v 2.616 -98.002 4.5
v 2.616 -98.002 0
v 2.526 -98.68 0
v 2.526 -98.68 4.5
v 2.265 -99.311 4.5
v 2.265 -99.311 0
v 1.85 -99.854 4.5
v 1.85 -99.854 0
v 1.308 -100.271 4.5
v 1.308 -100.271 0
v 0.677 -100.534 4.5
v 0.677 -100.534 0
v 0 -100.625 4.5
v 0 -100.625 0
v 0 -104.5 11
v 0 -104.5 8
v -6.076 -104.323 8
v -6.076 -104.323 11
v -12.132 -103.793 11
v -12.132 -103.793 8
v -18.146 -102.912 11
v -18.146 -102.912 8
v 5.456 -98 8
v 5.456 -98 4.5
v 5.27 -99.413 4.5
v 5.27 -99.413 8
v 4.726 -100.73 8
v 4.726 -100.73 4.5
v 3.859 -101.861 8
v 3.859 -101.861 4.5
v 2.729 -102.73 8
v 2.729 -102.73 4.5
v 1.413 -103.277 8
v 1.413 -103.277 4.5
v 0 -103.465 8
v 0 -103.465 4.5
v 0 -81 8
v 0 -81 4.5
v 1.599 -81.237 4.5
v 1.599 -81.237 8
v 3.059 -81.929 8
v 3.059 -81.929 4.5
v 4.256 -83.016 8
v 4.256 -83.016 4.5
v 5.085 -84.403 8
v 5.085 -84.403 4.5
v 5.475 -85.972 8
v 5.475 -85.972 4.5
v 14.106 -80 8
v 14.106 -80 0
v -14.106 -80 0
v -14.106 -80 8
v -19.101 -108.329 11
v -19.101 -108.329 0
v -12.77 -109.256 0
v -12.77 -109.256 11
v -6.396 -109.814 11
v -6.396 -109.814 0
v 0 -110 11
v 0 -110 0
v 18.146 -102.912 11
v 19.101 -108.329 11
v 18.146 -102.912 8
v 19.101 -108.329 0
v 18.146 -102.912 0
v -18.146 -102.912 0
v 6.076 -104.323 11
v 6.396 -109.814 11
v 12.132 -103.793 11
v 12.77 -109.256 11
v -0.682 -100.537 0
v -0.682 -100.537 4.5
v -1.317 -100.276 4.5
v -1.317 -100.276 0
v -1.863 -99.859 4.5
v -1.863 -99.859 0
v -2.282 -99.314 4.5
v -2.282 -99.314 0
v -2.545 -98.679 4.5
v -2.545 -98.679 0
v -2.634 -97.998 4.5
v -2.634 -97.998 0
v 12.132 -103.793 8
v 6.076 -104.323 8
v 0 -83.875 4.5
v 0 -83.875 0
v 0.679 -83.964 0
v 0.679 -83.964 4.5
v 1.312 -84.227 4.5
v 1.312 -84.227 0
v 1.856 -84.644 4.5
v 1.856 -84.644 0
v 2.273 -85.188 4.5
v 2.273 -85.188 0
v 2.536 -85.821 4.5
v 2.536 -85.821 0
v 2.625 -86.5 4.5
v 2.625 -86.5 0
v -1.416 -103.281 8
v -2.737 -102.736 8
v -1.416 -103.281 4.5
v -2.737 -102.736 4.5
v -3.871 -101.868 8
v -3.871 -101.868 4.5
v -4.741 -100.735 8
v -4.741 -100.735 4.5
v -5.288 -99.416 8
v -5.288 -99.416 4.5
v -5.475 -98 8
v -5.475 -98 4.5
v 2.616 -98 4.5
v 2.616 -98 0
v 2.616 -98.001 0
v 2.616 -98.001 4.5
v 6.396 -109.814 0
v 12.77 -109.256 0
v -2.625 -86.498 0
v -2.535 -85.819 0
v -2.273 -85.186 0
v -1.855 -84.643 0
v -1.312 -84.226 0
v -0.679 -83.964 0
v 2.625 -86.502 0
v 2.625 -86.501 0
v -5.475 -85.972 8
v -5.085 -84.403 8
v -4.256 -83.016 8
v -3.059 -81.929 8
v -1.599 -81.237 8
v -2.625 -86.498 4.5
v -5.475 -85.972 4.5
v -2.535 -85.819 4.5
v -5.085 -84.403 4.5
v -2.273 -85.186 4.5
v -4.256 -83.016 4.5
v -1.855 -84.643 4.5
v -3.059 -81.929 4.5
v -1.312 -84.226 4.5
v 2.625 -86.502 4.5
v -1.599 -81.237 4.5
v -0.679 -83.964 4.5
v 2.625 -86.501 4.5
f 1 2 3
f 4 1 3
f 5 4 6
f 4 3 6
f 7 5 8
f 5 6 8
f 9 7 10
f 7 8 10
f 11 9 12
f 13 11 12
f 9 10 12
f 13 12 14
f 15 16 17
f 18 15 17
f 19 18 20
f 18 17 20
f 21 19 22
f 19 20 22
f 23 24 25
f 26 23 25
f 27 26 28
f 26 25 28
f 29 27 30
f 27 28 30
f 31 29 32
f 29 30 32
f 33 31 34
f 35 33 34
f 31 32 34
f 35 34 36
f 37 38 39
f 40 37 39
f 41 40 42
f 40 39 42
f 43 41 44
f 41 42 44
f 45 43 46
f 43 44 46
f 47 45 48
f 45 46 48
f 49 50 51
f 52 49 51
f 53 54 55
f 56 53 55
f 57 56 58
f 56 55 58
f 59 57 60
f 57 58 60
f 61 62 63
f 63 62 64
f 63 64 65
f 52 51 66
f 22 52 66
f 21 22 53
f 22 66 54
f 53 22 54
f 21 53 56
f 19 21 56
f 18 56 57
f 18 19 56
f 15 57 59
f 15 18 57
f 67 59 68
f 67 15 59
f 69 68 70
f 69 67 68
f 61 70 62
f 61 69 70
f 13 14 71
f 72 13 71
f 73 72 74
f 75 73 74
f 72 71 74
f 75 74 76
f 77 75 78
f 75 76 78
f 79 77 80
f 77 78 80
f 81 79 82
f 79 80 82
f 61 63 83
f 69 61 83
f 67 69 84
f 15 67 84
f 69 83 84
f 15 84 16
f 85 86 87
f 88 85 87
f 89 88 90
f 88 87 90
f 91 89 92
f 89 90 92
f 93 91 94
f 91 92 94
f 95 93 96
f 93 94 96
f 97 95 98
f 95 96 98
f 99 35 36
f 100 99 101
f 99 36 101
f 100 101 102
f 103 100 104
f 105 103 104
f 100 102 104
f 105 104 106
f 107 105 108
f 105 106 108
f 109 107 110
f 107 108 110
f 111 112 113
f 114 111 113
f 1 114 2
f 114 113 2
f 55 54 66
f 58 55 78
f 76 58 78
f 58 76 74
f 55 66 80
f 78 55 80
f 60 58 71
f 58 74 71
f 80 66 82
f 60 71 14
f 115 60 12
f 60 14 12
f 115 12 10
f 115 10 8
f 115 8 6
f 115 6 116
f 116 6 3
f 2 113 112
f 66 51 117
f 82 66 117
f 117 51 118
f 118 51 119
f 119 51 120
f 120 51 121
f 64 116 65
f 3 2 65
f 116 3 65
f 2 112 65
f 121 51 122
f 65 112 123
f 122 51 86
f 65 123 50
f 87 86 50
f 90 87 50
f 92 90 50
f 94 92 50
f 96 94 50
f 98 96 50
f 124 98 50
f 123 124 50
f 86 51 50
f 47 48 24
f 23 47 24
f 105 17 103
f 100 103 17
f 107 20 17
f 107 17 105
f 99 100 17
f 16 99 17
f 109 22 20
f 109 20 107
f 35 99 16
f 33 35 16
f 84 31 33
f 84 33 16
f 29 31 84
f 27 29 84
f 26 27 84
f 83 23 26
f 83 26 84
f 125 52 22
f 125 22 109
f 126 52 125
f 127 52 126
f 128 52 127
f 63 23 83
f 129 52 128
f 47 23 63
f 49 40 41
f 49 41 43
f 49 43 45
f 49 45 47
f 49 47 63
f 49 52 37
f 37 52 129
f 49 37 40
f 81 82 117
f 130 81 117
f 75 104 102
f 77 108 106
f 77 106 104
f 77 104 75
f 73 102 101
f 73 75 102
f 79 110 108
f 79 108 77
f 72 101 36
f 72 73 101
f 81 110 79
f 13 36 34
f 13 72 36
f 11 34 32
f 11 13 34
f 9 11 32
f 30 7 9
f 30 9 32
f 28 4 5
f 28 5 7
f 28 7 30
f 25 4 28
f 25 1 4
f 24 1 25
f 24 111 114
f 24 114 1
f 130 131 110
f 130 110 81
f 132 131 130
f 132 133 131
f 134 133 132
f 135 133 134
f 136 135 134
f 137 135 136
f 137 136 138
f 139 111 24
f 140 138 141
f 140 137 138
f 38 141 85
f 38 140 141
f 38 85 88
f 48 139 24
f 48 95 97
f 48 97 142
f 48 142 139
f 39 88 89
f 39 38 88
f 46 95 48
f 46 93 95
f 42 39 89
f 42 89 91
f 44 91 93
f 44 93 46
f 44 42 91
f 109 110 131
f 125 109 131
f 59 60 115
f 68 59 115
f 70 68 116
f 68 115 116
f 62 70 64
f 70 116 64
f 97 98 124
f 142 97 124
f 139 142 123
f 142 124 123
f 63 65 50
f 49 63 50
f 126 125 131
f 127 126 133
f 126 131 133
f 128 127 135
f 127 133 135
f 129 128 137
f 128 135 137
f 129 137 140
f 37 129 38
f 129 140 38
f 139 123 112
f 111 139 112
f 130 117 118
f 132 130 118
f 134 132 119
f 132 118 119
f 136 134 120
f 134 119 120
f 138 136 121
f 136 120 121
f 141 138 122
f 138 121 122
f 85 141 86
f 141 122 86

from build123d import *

# Parameters (mm, degrees)
F1_DEPTH = 11
F2_DEPTH = 8
F3_DEPTH = 4.5


# Not quite as in the source:
# - ends of sketch curves that miss each other by under 0.0002 mm in the source are joined
# - a feature names something its author has since deleted; it is built from what else it names


with BuildPart() as f1:
    # F0 (on Top) → F1 (new body)
    with BuildSketch(Plane.XY):
        with BuildLine():
            ThreePointArc((-3.905e-06, -110), (9.5871245695, -109.5814174141), (19.1012892866, -108.3288546399))
            Line((19.1012892866, -108.3288546399), (18.1462248222, -102.9124119079))
            ThreePointArc((18.1462248222, -102.9124119079), (9.107768341, -104.1023465434), (-3.7098e-06, -104.5))
            Line((-3.7098e-06, -104.5), (-3.905e-06, -110))
        make_face()
        with BuildLine():
            Line((-18.1462345662, -102.9124101898), (-19.1012995434, -108.3288528313))
            ThreePointArc((-19.1012995434, -108.3288528313), (-9.5871336473, -109.5814166199), (-3.905e-06, -110))
            Line((-3.905e-06, -110), (-3.7098e-06, -104.5))
            ThreePointArc((-3.7098e-06, -104.5), (-9.107776965, -104.1023457889), (-18.1462345662, -102.9124101898))
        make_face()
    extrude(amount=F1_DEPTH)

    # F0 (on Top) → F2 (join)
    with BuildSketch(Plane.XY):
        with BuildLine():
            Line((-14.1061584567, -80), (-18.1462345662, -102.9124101898))
            ThreePointArc((-18.1462345662, -102.9124101898), (-9.107776965, -104.1023457889), (-3.7098e-06, -104.5))
            Line((-3.7098e-06, -104.5), (-3.673e-06, -103.4654280496))
            ThreePointArc((-3.673e-06, -103.4654280496), (-3.8705432222, -101.8678665034), (-5.4745569582, -97.999996388))
            Line((-5.4745569582, -97.999996388), (-5.4745569582, -85.9715496865))
            ThreePointArc((-5.4745569582, -85.9715496865), (-3.6975375335, -82.4283616447), (-2.8755e-06, -81))
            Line((-2.8755e-06, -81), (-2.84e-06, -80))
            Line((-2.84e-06, -80), (-14.1061584567, -80))
        make_face()
        with BuildLine():
            ThreePointArc((-3.7098e-06, -104.5), (9.107768341, -104.1023465434), (18.1462248222, -102.9124119079))
            Line((18.1462248222, -102.9124119079), (14.1061506466, -80))
            Line((14.1061506466, -80), (-2.84e-06, -80))
            Line((-2.84e-06, -80), (-2.8755e-06, -81))
            ThreePointArc((-2.8755e-06, -81), (3.6975315365, -82.4283617759), (5.4745508166, -85.9715496865))
            Line((5.4745508166, -85.9715496865), (5.4563215634, -97.999996388))
            ThreePointArc((5.4563215634, -97.999996388), (3.8587524181, -101.8614219128), (-3.673e-06, -103.4654280496))
            Line((-3.673e-06, -103.4654280496), (-3.7098e-06, -104.5))
        make_face()
    extrude(amount=F2_DEPTH)

    # F0 (on Top) → F3 (join)
    with BuildSketch(Plane.XY):
        with BuildLine():
            ThreePointArc((-5.4745569582, -97.999996388), (-3.8705432222, -101.8678665034), (-3.673e-06, -103.4654280496))
            Line((-3.673e-06, -103.4654280496), (-3.5722e-06, -100.6249805656))
            ThreePointArc((-3.5722e-06, -100.6249805656), (-1.862784569, -99.858636786), (-2.6341168729, -97.9979158754))
            Line((-2.6341168729, -97.9979158754), (-2.6250022463, -86.4979194874))
            ThreePointArc((-2.6250022463, -86.4979194874), (-1.8554226203, -84.6431092399), (-2.9776e-06, -83.875))
            Line((-2.9776e-06, -83.875), (-2.8755e-06, -81))
            ThreePointArc((-2.8755e-06, -81), (-3.6975375335, -82.4283616447), (-5.4745569582, -85.9715496865))
            Line((-5.4745569582, -85.9715496865), (-5.4745569582, -97.999996388))
        make_face()
        with BuildLine():
            Line((-3.5722e-06, -100.6249805656), (-3.673e-06, -103.4654280496))
            ThreePointArc((-3.673e-06, -103.4654280496), (3.8587524181, -101.8614219128), (5.4563215634, -97.999996388))
            Line((5.4563215634, -97.999996388), (5.4745508166, -85.9715496865))
            ThreePointArc((5.4745508166, -85.9715496865), (3.6975315365, -82.4283617759), (-2.8755e-06, -81))
            Line((-2.8755e-06, -81), (-2.9776e-06, -83.875))
            ThreePointArc((-2.9776e-06, -83.875), (1.8561522628, -84.6438447323), (2.6249969292, -86.5))
            ThreePointArc((2.6249969292, -86.5), (2.6249967231, -86.5010402564), (2.6249961047, -86.5020805126))
            Line((2.6249961047, -86.5020805126), (2.6158831271, -97.9999963886))
            ThreePointArc((2.6158831271, -97.9999963886), (2.6158820965, -98.0010366444), (2.6158814781, -98.0020769006))
            ThreePointArc((2.6158814781, -98.0020769006), (1.8495227006, -99.8536632596), (-3.5722e-06, -100.6249805656))
        make_face()
    extrude(amount=F3_DEPTH)


solid = f1.part
